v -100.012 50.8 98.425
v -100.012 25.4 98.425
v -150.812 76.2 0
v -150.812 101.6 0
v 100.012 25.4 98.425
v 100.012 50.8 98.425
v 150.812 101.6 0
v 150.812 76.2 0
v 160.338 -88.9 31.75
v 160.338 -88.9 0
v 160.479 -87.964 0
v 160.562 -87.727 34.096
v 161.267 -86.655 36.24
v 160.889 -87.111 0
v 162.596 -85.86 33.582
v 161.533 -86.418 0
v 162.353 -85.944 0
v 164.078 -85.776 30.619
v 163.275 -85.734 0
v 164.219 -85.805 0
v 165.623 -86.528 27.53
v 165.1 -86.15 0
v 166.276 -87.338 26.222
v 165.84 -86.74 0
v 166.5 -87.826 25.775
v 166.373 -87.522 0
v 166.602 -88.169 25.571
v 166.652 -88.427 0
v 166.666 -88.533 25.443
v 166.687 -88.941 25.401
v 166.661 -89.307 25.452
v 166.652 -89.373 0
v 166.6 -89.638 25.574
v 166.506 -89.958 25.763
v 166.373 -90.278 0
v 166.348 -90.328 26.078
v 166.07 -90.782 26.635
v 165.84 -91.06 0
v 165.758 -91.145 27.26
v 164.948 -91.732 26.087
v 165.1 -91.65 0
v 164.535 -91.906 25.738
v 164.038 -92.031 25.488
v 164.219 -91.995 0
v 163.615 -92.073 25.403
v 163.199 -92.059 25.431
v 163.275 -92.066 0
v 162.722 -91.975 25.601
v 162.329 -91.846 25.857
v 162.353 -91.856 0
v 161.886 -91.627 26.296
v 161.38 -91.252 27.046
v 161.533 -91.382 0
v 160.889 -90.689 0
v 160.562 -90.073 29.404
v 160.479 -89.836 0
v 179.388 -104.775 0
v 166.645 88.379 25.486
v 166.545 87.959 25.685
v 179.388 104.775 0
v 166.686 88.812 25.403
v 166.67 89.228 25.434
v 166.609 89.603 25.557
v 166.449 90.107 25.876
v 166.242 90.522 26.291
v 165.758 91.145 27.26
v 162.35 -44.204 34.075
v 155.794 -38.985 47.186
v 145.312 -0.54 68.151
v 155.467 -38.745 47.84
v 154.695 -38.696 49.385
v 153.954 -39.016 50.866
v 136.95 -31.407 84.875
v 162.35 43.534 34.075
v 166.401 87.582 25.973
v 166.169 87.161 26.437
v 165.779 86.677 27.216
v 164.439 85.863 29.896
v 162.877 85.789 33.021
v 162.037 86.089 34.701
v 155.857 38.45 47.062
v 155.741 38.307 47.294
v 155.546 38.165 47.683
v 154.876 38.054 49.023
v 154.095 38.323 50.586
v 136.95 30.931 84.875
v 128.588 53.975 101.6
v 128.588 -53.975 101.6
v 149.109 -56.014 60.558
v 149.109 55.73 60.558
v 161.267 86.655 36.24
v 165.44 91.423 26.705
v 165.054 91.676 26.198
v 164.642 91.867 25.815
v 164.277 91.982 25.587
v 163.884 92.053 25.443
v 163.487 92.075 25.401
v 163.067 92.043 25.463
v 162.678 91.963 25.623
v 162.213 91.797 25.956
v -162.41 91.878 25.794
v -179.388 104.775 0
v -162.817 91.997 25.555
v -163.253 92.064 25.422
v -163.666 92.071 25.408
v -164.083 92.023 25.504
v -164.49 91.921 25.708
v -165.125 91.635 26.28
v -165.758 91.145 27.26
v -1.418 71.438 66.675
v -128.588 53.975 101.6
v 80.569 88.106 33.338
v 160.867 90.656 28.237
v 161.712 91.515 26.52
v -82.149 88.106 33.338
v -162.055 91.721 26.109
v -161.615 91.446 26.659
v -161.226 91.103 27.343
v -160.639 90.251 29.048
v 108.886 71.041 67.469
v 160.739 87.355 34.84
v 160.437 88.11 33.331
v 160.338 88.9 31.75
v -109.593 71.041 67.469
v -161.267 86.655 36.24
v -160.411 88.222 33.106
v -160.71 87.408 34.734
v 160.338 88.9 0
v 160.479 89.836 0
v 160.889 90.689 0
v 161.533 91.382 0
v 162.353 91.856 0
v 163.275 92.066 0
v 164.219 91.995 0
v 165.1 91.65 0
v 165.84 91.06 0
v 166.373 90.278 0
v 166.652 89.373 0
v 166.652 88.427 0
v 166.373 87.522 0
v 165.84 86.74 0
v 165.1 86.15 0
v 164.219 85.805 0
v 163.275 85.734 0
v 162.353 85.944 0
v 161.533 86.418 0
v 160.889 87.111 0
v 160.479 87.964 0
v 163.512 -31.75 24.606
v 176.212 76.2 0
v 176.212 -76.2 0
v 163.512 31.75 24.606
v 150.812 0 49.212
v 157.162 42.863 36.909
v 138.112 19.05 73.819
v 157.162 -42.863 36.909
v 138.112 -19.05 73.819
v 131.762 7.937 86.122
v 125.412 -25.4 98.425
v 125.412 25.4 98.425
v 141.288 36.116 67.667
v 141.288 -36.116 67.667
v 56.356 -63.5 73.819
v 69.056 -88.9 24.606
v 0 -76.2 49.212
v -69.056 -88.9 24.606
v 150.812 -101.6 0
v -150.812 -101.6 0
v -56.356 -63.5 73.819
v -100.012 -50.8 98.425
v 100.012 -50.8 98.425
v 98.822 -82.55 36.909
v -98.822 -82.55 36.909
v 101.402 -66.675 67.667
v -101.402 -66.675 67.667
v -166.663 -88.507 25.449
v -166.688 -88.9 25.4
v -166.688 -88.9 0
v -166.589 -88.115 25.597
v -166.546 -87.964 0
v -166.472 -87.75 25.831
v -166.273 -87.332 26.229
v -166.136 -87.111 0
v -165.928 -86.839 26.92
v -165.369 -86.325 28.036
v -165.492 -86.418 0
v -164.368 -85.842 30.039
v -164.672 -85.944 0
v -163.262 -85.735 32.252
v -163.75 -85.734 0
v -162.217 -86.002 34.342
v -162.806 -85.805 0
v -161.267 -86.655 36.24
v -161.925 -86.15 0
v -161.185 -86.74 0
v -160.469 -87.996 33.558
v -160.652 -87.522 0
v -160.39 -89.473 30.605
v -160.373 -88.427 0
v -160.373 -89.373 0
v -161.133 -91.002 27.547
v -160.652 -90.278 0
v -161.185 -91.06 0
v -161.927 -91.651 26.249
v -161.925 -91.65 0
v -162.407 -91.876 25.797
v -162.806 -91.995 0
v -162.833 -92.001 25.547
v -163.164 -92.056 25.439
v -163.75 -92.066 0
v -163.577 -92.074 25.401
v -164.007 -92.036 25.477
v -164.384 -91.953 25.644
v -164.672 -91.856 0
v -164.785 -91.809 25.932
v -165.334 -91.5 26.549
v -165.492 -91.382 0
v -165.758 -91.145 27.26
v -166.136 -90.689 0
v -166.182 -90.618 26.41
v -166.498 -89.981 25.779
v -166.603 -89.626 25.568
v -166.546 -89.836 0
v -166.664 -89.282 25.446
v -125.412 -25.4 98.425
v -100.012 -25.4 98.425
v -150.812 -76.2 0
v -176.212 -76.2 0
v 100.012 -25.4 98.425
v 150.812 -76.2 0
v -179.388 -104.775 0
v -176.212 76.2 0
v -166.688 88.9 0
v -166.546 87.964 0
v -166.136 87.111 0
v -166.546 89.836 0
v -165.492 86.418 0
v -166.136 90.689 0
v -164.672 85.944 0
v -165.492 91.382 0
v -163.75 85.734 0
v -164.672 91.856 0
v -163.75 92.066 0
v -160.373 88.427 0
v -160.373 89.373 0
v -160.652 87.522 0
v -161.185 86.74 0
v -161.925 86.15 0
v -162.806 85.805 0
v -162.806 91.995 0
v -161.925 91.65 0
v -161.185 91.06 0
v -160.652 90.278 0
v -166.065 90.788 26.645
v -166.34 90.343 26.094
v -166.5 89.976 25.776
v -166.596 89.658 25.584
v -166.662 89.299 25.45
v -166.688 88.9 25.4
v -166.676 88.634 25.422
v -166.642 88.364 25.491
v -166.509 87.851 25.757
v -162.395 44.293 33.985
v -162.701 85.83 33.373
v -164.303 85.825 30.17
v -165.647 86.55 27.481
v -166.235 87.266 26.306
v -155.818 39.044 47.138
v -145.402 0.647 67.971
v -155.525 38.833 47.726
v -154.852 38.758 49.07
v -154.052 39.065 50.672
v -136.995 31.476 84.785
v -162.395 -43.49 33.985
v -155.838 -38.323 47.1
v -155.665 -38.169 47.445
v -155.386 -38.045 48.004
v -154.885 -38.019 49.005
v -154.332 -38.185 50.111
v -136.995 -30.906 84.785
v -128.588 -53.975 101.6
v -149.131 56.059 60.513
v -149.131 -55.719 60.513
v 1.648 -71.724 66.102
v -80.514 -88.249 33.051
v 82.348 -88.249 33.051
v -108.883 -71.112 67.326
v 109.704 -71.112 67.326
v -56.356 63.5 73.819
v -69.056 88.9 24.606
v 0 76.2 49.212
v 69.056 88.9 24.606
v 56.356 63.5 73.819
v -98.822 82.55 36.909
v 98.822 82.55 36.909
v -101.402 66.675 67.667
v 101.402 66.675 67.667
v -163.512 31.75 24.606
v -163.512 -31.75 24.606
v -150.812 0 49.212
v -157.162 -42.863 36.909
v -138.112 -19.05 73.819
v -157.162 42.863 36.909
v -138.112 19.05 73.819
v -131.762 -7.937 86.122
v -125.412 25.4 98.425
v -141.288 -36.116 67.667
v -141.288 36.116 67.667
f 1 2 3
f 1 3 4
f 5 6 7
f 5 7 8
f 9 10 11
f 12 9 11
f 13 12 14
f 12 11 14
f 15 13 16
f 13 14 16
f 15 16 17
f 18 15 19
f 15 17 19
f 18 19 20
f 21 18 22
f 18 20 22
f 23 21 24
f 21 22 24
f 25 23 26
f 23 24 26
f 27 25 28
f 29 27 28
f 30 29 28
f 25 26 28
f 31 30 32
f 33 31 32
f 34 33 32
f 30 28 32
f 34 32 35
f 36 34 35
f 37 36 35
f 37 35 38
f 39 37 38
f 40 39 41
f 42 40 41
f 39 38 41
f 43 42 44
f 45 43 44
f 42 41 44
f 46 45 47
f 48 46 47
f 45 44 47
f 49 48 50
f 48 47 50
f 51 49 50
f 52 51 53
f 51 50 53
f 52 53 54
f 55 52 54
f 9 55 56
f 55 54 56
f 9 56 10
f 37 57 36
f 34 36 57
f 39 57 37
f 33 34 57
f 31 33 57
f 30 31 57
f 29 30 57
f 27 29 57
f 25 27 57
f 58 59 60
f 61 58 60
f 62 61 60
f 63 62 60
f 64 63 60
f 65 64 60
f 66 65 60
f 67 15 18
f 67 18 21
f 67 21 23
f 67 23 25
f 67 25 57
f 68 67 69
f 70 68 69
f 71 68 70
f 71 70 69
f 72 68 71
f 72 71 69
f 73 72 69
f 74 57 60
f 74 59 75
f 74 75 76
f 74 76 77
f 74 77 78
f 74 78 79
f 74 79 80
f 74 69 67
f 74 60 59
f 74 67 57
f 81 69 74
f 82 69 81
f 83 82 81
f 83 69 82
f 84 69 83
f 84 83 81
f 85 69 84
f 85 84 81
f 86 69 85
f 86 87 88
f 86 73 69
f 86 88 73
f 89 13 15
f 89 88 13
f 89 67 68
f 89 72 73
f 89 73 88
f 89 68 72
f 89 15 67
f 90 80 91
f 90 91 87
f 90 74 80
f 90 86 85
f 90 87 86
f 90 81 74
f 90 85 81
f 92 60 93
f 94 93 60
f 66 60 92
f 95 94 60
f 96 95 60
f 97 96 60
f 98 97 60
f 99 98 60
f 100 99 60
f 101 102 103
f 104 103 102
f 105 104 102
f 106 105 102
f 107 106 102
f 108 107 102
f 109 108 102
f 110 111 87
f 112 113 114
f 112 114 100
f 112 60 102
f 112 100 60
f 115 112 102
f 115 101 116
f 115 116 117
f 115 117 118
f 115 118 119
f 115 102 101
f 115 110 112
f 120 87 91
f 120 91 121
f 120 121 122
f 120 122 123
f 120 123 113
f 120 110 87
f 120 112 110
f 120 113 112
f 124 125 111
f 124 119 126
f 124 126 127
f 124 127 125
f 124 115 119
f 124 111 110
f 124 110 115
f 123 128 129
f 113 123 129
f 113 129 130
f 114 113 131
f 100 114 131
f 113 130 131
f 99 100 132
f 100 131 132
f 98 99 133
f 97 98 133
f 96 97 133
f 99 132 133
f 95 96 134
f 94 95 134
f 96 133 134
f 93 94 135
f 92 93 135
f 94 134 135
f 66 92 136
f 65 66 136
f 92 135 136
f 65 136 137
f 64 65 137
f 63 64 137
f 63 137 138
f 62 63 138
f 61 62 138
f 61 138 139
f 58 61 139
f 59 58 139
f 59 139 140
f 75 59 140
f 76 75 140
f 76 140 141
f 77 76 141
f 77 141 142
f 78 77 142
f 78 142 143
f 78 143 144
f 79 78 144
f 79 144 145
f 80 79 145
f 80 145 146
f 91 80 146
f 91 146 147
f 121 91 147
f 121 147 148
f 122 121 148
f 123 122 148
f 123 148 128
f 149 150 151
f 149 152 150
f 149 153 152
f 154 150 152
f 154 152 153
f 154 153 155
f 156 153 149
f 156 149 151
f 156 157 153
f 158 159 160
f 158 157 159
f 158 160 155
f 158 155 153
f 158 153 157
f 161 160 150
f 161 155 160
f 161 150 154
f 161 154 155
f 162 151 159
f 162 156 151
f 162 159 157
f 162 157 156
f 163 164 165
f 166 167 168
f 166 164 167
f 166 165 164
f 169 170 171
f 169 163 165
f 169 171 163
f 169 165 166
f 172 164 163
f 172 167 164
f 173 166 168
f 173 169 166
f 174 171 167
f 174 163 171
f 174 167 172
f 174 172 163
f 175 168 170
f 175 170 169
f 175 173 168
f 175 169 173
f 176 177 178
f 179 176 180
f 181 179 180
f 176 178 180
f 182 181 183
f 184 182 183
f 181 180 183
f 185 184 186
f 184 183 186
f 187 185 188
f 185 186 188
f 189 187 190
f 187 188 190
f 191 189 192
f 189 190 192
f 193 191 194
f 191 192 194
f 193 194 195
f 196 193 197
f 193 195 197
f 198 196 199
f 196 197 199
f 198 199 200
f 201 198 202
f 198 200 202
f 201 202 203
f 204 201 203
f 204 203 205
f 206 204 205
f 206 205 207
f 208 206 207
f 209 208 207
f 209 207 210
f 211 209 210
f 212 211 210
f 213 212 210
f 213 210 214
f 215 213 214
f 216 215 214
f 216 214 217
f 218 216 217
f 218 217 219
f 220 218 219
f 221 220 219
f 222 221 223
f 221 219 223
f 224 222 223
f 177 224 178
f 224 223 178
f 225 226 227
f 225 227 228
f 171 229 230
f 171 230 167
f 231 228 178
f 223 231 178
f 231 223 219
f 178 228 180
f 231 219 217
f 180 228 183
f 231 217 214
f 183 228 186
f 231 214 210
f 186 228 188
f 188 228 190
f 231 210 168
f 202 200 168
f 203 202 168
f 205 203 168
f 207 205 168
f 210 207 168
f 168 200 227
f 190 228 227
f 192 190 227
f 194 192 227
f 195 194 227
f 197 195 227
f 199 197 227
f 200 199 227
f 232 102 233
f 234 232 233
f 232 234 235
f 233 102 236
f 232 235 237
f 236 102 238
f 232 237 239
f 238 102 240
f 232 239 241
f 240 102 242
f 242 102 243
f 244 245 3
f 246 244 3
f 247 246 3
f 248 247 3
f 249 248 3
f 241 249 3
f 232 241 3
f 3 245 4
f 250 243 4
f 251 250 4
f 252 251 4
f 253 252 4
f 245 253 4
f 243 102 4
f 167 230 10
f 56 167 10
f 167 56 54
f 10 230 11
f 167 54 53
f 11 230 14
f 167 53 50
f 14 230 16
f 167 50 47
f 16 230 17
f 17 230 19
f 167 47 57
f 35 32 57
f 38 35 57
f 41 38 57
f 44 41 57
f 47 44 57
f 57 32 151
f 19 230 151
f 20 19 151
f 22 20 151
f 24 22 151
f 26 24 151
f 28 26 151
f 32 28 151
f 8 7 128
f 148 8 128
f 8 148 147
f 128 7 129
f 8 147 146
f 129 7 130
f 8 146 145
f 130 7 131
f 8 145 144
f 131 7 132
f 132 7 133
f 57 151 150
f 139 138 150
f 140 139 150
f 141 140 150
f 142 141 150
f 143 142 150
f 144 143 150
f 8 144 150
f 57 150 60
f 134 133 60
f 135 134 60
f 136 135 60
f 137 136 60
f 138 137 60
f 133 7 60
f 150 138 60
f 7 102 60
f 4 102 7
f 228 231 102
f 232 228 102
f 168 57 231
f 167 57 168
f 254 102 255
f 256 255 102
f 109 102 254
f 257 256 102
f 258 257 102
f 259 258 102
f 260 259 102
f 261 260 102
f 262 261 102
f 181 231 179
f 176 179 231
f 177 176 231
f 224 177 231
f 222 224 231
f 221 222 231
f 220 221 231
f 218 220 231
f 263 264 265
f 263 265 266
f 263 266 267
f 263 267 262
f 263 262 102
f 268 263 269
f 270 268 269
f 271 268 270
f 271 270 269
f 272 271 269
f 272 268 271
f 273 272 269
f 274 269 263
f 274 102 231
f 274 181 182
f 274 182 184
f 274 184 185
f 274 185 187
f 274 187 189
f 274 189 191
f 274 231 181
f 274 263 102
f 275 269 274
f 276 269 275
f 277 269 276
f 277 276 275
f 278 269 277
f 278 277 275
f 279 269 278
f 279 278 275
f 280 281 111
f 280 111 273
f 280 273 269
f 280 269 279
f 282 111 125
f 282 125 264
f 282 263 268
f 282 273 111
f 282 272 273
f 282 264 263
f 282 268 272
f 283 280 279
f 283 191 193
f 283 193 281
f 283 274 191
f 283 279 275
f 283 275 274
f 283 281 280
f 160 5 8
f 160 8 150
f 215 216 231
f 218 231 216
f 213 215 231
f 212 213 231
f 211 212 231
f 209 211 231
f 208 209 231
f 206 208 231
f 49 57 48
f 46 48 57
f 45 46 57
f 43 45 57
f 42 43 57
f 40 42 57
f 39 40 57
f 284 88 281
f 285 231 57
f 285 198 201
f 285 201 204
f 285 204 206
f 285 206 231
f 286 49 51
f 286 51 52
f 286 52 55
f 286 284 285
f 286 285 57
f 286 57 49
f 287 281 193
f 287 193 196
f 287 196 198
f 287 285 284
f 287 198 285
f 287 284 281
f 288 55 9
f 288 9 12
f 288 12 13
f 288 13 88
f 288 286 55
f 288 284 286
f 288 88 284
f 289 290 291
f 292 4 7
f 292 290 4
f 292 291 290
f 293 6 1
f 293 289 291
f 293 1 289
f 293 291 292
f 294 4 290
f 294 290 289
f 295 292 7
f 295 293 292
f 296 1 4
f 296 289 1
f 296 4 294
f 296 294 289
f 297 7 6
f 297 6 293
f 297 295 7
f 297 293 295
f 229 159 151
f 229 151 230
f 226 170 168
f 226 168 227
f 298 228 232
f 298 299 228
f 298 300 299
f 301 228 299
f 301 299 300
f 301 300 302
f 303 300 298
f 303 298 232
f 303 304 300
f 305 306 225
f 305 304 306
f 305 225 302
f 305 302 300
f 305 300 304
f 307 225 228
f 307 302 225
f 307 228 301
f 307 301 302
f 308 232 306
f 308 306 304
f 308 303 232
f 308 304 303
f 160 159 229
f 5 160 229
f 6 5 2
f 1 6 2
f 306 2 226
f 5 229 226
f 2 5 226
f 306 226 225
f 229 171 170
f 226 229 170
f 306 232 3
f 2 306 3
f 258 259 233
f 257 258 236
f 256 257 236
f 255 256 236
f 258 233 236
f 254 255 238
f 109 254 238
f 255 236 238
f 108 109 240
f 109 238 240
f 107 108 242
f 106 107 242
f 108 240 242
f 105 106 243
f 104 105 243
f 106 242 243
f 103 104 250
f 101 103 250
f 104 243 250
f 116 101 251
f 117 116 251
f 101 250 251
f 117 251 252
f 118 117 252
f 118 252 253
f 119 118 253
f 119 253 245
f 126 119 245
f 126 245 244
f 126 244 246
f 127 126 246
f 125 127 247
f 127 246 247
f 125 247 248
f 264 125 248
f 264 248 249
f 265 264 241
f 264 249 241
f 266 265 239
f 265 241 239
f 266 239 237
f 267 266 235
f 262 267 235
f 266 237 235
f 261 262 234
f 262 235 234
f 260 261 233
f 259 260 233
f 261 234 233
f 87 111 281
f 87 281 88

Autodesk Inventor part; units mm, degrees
ref_plane "YZ Plane" through (0, 0, 0) normal (1, 0, 0) x (0, 1, 0)
sketch "Sketch1" plane through (0, 0, 0) normal (0, 0, 1) x (1, 0, 0)
  line L0 (-251.1425, 0) -> (251.1425, 0) construction
  line L1 (0, -146.685) -> (0, 146.685) construction
  line L2 (-179.3875, 104.775) -> (179.3875, 104.775)
  line L3 (179.3875, 104.775) -> (179.3875, -104.775)
  line L4 (179.3875, -104.775) -> (-179.3875, -104.775)
  line L5 (-179.3875, -104.775) -> (-179.3875, 104.775)
  point P0 (0, 0)
  point P1 (0, 104.775)
  point P2 (-179.3875, 0)
  dimension "d0" = 358.775
  dimension "d1" = 209.55
ref_plane "Work Plane1" through (0, 0, 101.6) normal (0, 0, 1) x (1, 0, 0)
sketch "Sketch2" plane through (0, 0, 101.6) normal (0, 0, 1) x (1, 0, 0)
  line L0 (0, -146.685) -> (0, 146.685) construction
  line L1 (-253.365, 0) -> (253.365, 0) construction
  line L2 (-128.5875, 53.975) -> (128.5875, 53.975)
  line L3 (128.5875, 53.975) -> (128.5875, -53.975)
  line L4 (128.5875, -53.975) -> (-128.5875, -53.975)
  line L5 (-128.5875, -53.975) -> (-128.5875, 53.975)
  line L6 (-179.3875, 104.775) -> (179.3875, 104.775) construction
  line L7 (-179.3875, -104.775) -> (-179.3875, 104.775) construction
  point P0 (0, 0)
  point P1 (0, 53.975)
  point P2 (-128.5875, 0)
  dimension "d3" = 50.8
  dimension "d4" = 50.8
loft "Loft1" add profiles "Sketch1", "Sketch2"
sketch "Sketch3" plane through (179.3875, 104.775, 0) normal (0, 0, -1) x (-1, 0, 0)
  line L0 (179.3875, -251.46) -> (179.3875, 41.91) construction
  line L1 (430.53, -104.775) -> (-71.755, -104.775) construction
  line L2 (3.175, -3.175) -> (28.575, -3.175) construction
  line L3 (355.6, -3.175) -> (355.6, -28.575) construction
  line L4 (355.6, -206.375) -> (330.2, -206.375) construction
  line L5 (3.175, -206.375) -> (3.175, -180.975) construction
  line L6 (28.575, -3.175) -> (28.575, -28.575)
  line L7 (28.575, -28.575) -> (3.175, -28.575)
  line L8 (3.175, -180.975) -> (28.575, -180.975)
  line L9 (28.575, -180.975) -> (28.575, -206.375)
  line L10 (330.2, -3.175) -> (330.2, -28.575)
  line L11 (330.2, -28.575) -> (355.6, -28.575)
  line L12 (330.2, -206.375) -> (330.2, -180.975)
  line L13 (330.2, -180.975) -> (355.6, -180.975)
  line L14 (3.175, -28.575) -> (3.175, -3.175) construction
  line L15 (28.575, -3.175) -> (330.2, -3.175)
  line L16 (330.2, -3.175) -> (355.6, -3.175) construction
  line L17 (355.6, -28.575) -> (355.6, -180.975)
  line L18 (355.6, -180.975) -> (355.6, -206.375) construction
  line L19 (330.2, -206.375) -> (28.575, -206.375)
  line L20 (28.575, -206.375) -> (3.175, -206.375) construction
  line L21 (3.175, -180.975) -> (3.175, -28.575)
  line L22 (0, 0) -> (0, -209.55) construction
  line L23 (358.775, 0) -> (0, 0) construction
  point P0 (179.3875, -104.775)
  point P1 (179.3875, -3.175)
  point P2 (3.175, -104.775)
  dimension "d9" = 3.175
  dimension "d10" = 3.175
  dimension "d11" = 25.4
ref_plane "Work Plane2" through (0, 0, 98.425) normal (0, 0, 1) x (1, 0, 0)
sketch "Sketch5" plane through (0, 0, 98.425) normal (0, 0, 1) x (1, 0, 0)
  line L0 (150.8125, 101.6) -> (150.8125, 76.2) projected
  line L1 (150.8125, 76.2) -> (176.2125, 76.2) projected
  line L2 (176.2125, -76.2) -> (176.2125, 76.2) projected
  line L3 (176.2125, -76.2) -> (150.8125, -76.2) projected
  line L4 (150.8125, -76.2) -> (150.8125, -101.6) projected
  line L5 (-150.8125, -101.6) -> (150.8125, -101.6) projected
  line L6 (-150.8125, -101.6) -> (-150.8125, -76.2) projected
  line L7 (-150.8125, -76.2) -> (-176.2125, -76.2) projected
  line L8 (-176.2125, 76.2) -> (-176.2125, -76.2) projected
  line L9 (-150.8125, 76.2) -> (-176.2125, 76.2) projected
  line L10 (-150.8125, 101.6) -> (-150.8125, 76.2) projected
  line L11 (150.8125, 101.6) -> (-150.8125, 101.6) projected
  line L12 (-100.0125, 50.8) -> (-100.0125, 25.4)
  line L13 (-100.0125, 25.4) -> (-125.4125, 25.4)
  line L14 (-125.4125, 25.4) -> (-125.4125, -25.4)
  line L15 (-125.4125, -25.4) -> (-100.0125, -25.4)
  line L16 (-100.0125, -25.4) -> (-100.0125, -50.8)
  line L17 (-100.0125, -50.8) -> (100.0125, -50.8)
  line L18 (100.0125, -50.8) -> (100.0125, -25.4)
  line L19 (100.0125, -25.4) -> (125.4125, -25.4)
  line L20 (125.4125, -25.4) -> (125.4125, 25.4)
  line L21 (125.4125, 25.4) -> (100.0125, 25.4)
  line L22 (100.0125, 25.4) -> (100.0125, 50.8)
  line L23 (100.0125, 50.8) -> (-100.0125, 50.8)
  line L24 (-128.5875, 53.975) -> (128.5875, 53.975) projected
  point P0 (0, 0)
  dimension "d15" = 3.175
loft "Loft2" cut profiles "Sketch3", "Sketch5" contours all / L23 L22 L21 L20 L19 L18 L17 L16 L15 L14 L13 L12
sketch "Sketch6" plane through (179.3875, 104.775, 0) normal (0, 0, -1) x (-1, 0, 0)
  line L0 (430.53, -104.775) -> (-71.755, -104.775) construction
  line L1 (179.3875, -251.46) -> (179.3875, 41.91) construction
  line L2 (15.875, -15.875) -> (342.9, -15.875) construction
  line L3 (342.9, -15.875) -> (342.9, -193.675) construction
  line L4 (342.9, -193.675) -> (15.875, -193.675) construction
  line L5 (15.875, -193.675) -> (15.875, -15.875) construction
  line L6 (3.175, -28.575) -> (28.575, -28.575) construction
  line L7 (28.575, -28.575) -> (28.575, -3.175) construction
  circle A0 centre (15.875, -15.875) radius 3.175
  circle A1 centre (342.9, -15.875) radius 3.175
  circle A2 centre (342.9, -193.675) radius 3.175
  circle A3 centre (15.875, -193.675) radius 3.175
  point P0 (179.3875, -104.775)
  point P1 (179.3875, -15.875)
  point P2 (15.875, -104.775)
  dimension "d20" = 12.7
  dimension "d21" = 12.7
  dimension "d22" = 6.35
extrude "Extrusion1" cut sketch "Sketch6" against normal through all
equation "\"d21\" = d20"
properties part number "Front Cover"
